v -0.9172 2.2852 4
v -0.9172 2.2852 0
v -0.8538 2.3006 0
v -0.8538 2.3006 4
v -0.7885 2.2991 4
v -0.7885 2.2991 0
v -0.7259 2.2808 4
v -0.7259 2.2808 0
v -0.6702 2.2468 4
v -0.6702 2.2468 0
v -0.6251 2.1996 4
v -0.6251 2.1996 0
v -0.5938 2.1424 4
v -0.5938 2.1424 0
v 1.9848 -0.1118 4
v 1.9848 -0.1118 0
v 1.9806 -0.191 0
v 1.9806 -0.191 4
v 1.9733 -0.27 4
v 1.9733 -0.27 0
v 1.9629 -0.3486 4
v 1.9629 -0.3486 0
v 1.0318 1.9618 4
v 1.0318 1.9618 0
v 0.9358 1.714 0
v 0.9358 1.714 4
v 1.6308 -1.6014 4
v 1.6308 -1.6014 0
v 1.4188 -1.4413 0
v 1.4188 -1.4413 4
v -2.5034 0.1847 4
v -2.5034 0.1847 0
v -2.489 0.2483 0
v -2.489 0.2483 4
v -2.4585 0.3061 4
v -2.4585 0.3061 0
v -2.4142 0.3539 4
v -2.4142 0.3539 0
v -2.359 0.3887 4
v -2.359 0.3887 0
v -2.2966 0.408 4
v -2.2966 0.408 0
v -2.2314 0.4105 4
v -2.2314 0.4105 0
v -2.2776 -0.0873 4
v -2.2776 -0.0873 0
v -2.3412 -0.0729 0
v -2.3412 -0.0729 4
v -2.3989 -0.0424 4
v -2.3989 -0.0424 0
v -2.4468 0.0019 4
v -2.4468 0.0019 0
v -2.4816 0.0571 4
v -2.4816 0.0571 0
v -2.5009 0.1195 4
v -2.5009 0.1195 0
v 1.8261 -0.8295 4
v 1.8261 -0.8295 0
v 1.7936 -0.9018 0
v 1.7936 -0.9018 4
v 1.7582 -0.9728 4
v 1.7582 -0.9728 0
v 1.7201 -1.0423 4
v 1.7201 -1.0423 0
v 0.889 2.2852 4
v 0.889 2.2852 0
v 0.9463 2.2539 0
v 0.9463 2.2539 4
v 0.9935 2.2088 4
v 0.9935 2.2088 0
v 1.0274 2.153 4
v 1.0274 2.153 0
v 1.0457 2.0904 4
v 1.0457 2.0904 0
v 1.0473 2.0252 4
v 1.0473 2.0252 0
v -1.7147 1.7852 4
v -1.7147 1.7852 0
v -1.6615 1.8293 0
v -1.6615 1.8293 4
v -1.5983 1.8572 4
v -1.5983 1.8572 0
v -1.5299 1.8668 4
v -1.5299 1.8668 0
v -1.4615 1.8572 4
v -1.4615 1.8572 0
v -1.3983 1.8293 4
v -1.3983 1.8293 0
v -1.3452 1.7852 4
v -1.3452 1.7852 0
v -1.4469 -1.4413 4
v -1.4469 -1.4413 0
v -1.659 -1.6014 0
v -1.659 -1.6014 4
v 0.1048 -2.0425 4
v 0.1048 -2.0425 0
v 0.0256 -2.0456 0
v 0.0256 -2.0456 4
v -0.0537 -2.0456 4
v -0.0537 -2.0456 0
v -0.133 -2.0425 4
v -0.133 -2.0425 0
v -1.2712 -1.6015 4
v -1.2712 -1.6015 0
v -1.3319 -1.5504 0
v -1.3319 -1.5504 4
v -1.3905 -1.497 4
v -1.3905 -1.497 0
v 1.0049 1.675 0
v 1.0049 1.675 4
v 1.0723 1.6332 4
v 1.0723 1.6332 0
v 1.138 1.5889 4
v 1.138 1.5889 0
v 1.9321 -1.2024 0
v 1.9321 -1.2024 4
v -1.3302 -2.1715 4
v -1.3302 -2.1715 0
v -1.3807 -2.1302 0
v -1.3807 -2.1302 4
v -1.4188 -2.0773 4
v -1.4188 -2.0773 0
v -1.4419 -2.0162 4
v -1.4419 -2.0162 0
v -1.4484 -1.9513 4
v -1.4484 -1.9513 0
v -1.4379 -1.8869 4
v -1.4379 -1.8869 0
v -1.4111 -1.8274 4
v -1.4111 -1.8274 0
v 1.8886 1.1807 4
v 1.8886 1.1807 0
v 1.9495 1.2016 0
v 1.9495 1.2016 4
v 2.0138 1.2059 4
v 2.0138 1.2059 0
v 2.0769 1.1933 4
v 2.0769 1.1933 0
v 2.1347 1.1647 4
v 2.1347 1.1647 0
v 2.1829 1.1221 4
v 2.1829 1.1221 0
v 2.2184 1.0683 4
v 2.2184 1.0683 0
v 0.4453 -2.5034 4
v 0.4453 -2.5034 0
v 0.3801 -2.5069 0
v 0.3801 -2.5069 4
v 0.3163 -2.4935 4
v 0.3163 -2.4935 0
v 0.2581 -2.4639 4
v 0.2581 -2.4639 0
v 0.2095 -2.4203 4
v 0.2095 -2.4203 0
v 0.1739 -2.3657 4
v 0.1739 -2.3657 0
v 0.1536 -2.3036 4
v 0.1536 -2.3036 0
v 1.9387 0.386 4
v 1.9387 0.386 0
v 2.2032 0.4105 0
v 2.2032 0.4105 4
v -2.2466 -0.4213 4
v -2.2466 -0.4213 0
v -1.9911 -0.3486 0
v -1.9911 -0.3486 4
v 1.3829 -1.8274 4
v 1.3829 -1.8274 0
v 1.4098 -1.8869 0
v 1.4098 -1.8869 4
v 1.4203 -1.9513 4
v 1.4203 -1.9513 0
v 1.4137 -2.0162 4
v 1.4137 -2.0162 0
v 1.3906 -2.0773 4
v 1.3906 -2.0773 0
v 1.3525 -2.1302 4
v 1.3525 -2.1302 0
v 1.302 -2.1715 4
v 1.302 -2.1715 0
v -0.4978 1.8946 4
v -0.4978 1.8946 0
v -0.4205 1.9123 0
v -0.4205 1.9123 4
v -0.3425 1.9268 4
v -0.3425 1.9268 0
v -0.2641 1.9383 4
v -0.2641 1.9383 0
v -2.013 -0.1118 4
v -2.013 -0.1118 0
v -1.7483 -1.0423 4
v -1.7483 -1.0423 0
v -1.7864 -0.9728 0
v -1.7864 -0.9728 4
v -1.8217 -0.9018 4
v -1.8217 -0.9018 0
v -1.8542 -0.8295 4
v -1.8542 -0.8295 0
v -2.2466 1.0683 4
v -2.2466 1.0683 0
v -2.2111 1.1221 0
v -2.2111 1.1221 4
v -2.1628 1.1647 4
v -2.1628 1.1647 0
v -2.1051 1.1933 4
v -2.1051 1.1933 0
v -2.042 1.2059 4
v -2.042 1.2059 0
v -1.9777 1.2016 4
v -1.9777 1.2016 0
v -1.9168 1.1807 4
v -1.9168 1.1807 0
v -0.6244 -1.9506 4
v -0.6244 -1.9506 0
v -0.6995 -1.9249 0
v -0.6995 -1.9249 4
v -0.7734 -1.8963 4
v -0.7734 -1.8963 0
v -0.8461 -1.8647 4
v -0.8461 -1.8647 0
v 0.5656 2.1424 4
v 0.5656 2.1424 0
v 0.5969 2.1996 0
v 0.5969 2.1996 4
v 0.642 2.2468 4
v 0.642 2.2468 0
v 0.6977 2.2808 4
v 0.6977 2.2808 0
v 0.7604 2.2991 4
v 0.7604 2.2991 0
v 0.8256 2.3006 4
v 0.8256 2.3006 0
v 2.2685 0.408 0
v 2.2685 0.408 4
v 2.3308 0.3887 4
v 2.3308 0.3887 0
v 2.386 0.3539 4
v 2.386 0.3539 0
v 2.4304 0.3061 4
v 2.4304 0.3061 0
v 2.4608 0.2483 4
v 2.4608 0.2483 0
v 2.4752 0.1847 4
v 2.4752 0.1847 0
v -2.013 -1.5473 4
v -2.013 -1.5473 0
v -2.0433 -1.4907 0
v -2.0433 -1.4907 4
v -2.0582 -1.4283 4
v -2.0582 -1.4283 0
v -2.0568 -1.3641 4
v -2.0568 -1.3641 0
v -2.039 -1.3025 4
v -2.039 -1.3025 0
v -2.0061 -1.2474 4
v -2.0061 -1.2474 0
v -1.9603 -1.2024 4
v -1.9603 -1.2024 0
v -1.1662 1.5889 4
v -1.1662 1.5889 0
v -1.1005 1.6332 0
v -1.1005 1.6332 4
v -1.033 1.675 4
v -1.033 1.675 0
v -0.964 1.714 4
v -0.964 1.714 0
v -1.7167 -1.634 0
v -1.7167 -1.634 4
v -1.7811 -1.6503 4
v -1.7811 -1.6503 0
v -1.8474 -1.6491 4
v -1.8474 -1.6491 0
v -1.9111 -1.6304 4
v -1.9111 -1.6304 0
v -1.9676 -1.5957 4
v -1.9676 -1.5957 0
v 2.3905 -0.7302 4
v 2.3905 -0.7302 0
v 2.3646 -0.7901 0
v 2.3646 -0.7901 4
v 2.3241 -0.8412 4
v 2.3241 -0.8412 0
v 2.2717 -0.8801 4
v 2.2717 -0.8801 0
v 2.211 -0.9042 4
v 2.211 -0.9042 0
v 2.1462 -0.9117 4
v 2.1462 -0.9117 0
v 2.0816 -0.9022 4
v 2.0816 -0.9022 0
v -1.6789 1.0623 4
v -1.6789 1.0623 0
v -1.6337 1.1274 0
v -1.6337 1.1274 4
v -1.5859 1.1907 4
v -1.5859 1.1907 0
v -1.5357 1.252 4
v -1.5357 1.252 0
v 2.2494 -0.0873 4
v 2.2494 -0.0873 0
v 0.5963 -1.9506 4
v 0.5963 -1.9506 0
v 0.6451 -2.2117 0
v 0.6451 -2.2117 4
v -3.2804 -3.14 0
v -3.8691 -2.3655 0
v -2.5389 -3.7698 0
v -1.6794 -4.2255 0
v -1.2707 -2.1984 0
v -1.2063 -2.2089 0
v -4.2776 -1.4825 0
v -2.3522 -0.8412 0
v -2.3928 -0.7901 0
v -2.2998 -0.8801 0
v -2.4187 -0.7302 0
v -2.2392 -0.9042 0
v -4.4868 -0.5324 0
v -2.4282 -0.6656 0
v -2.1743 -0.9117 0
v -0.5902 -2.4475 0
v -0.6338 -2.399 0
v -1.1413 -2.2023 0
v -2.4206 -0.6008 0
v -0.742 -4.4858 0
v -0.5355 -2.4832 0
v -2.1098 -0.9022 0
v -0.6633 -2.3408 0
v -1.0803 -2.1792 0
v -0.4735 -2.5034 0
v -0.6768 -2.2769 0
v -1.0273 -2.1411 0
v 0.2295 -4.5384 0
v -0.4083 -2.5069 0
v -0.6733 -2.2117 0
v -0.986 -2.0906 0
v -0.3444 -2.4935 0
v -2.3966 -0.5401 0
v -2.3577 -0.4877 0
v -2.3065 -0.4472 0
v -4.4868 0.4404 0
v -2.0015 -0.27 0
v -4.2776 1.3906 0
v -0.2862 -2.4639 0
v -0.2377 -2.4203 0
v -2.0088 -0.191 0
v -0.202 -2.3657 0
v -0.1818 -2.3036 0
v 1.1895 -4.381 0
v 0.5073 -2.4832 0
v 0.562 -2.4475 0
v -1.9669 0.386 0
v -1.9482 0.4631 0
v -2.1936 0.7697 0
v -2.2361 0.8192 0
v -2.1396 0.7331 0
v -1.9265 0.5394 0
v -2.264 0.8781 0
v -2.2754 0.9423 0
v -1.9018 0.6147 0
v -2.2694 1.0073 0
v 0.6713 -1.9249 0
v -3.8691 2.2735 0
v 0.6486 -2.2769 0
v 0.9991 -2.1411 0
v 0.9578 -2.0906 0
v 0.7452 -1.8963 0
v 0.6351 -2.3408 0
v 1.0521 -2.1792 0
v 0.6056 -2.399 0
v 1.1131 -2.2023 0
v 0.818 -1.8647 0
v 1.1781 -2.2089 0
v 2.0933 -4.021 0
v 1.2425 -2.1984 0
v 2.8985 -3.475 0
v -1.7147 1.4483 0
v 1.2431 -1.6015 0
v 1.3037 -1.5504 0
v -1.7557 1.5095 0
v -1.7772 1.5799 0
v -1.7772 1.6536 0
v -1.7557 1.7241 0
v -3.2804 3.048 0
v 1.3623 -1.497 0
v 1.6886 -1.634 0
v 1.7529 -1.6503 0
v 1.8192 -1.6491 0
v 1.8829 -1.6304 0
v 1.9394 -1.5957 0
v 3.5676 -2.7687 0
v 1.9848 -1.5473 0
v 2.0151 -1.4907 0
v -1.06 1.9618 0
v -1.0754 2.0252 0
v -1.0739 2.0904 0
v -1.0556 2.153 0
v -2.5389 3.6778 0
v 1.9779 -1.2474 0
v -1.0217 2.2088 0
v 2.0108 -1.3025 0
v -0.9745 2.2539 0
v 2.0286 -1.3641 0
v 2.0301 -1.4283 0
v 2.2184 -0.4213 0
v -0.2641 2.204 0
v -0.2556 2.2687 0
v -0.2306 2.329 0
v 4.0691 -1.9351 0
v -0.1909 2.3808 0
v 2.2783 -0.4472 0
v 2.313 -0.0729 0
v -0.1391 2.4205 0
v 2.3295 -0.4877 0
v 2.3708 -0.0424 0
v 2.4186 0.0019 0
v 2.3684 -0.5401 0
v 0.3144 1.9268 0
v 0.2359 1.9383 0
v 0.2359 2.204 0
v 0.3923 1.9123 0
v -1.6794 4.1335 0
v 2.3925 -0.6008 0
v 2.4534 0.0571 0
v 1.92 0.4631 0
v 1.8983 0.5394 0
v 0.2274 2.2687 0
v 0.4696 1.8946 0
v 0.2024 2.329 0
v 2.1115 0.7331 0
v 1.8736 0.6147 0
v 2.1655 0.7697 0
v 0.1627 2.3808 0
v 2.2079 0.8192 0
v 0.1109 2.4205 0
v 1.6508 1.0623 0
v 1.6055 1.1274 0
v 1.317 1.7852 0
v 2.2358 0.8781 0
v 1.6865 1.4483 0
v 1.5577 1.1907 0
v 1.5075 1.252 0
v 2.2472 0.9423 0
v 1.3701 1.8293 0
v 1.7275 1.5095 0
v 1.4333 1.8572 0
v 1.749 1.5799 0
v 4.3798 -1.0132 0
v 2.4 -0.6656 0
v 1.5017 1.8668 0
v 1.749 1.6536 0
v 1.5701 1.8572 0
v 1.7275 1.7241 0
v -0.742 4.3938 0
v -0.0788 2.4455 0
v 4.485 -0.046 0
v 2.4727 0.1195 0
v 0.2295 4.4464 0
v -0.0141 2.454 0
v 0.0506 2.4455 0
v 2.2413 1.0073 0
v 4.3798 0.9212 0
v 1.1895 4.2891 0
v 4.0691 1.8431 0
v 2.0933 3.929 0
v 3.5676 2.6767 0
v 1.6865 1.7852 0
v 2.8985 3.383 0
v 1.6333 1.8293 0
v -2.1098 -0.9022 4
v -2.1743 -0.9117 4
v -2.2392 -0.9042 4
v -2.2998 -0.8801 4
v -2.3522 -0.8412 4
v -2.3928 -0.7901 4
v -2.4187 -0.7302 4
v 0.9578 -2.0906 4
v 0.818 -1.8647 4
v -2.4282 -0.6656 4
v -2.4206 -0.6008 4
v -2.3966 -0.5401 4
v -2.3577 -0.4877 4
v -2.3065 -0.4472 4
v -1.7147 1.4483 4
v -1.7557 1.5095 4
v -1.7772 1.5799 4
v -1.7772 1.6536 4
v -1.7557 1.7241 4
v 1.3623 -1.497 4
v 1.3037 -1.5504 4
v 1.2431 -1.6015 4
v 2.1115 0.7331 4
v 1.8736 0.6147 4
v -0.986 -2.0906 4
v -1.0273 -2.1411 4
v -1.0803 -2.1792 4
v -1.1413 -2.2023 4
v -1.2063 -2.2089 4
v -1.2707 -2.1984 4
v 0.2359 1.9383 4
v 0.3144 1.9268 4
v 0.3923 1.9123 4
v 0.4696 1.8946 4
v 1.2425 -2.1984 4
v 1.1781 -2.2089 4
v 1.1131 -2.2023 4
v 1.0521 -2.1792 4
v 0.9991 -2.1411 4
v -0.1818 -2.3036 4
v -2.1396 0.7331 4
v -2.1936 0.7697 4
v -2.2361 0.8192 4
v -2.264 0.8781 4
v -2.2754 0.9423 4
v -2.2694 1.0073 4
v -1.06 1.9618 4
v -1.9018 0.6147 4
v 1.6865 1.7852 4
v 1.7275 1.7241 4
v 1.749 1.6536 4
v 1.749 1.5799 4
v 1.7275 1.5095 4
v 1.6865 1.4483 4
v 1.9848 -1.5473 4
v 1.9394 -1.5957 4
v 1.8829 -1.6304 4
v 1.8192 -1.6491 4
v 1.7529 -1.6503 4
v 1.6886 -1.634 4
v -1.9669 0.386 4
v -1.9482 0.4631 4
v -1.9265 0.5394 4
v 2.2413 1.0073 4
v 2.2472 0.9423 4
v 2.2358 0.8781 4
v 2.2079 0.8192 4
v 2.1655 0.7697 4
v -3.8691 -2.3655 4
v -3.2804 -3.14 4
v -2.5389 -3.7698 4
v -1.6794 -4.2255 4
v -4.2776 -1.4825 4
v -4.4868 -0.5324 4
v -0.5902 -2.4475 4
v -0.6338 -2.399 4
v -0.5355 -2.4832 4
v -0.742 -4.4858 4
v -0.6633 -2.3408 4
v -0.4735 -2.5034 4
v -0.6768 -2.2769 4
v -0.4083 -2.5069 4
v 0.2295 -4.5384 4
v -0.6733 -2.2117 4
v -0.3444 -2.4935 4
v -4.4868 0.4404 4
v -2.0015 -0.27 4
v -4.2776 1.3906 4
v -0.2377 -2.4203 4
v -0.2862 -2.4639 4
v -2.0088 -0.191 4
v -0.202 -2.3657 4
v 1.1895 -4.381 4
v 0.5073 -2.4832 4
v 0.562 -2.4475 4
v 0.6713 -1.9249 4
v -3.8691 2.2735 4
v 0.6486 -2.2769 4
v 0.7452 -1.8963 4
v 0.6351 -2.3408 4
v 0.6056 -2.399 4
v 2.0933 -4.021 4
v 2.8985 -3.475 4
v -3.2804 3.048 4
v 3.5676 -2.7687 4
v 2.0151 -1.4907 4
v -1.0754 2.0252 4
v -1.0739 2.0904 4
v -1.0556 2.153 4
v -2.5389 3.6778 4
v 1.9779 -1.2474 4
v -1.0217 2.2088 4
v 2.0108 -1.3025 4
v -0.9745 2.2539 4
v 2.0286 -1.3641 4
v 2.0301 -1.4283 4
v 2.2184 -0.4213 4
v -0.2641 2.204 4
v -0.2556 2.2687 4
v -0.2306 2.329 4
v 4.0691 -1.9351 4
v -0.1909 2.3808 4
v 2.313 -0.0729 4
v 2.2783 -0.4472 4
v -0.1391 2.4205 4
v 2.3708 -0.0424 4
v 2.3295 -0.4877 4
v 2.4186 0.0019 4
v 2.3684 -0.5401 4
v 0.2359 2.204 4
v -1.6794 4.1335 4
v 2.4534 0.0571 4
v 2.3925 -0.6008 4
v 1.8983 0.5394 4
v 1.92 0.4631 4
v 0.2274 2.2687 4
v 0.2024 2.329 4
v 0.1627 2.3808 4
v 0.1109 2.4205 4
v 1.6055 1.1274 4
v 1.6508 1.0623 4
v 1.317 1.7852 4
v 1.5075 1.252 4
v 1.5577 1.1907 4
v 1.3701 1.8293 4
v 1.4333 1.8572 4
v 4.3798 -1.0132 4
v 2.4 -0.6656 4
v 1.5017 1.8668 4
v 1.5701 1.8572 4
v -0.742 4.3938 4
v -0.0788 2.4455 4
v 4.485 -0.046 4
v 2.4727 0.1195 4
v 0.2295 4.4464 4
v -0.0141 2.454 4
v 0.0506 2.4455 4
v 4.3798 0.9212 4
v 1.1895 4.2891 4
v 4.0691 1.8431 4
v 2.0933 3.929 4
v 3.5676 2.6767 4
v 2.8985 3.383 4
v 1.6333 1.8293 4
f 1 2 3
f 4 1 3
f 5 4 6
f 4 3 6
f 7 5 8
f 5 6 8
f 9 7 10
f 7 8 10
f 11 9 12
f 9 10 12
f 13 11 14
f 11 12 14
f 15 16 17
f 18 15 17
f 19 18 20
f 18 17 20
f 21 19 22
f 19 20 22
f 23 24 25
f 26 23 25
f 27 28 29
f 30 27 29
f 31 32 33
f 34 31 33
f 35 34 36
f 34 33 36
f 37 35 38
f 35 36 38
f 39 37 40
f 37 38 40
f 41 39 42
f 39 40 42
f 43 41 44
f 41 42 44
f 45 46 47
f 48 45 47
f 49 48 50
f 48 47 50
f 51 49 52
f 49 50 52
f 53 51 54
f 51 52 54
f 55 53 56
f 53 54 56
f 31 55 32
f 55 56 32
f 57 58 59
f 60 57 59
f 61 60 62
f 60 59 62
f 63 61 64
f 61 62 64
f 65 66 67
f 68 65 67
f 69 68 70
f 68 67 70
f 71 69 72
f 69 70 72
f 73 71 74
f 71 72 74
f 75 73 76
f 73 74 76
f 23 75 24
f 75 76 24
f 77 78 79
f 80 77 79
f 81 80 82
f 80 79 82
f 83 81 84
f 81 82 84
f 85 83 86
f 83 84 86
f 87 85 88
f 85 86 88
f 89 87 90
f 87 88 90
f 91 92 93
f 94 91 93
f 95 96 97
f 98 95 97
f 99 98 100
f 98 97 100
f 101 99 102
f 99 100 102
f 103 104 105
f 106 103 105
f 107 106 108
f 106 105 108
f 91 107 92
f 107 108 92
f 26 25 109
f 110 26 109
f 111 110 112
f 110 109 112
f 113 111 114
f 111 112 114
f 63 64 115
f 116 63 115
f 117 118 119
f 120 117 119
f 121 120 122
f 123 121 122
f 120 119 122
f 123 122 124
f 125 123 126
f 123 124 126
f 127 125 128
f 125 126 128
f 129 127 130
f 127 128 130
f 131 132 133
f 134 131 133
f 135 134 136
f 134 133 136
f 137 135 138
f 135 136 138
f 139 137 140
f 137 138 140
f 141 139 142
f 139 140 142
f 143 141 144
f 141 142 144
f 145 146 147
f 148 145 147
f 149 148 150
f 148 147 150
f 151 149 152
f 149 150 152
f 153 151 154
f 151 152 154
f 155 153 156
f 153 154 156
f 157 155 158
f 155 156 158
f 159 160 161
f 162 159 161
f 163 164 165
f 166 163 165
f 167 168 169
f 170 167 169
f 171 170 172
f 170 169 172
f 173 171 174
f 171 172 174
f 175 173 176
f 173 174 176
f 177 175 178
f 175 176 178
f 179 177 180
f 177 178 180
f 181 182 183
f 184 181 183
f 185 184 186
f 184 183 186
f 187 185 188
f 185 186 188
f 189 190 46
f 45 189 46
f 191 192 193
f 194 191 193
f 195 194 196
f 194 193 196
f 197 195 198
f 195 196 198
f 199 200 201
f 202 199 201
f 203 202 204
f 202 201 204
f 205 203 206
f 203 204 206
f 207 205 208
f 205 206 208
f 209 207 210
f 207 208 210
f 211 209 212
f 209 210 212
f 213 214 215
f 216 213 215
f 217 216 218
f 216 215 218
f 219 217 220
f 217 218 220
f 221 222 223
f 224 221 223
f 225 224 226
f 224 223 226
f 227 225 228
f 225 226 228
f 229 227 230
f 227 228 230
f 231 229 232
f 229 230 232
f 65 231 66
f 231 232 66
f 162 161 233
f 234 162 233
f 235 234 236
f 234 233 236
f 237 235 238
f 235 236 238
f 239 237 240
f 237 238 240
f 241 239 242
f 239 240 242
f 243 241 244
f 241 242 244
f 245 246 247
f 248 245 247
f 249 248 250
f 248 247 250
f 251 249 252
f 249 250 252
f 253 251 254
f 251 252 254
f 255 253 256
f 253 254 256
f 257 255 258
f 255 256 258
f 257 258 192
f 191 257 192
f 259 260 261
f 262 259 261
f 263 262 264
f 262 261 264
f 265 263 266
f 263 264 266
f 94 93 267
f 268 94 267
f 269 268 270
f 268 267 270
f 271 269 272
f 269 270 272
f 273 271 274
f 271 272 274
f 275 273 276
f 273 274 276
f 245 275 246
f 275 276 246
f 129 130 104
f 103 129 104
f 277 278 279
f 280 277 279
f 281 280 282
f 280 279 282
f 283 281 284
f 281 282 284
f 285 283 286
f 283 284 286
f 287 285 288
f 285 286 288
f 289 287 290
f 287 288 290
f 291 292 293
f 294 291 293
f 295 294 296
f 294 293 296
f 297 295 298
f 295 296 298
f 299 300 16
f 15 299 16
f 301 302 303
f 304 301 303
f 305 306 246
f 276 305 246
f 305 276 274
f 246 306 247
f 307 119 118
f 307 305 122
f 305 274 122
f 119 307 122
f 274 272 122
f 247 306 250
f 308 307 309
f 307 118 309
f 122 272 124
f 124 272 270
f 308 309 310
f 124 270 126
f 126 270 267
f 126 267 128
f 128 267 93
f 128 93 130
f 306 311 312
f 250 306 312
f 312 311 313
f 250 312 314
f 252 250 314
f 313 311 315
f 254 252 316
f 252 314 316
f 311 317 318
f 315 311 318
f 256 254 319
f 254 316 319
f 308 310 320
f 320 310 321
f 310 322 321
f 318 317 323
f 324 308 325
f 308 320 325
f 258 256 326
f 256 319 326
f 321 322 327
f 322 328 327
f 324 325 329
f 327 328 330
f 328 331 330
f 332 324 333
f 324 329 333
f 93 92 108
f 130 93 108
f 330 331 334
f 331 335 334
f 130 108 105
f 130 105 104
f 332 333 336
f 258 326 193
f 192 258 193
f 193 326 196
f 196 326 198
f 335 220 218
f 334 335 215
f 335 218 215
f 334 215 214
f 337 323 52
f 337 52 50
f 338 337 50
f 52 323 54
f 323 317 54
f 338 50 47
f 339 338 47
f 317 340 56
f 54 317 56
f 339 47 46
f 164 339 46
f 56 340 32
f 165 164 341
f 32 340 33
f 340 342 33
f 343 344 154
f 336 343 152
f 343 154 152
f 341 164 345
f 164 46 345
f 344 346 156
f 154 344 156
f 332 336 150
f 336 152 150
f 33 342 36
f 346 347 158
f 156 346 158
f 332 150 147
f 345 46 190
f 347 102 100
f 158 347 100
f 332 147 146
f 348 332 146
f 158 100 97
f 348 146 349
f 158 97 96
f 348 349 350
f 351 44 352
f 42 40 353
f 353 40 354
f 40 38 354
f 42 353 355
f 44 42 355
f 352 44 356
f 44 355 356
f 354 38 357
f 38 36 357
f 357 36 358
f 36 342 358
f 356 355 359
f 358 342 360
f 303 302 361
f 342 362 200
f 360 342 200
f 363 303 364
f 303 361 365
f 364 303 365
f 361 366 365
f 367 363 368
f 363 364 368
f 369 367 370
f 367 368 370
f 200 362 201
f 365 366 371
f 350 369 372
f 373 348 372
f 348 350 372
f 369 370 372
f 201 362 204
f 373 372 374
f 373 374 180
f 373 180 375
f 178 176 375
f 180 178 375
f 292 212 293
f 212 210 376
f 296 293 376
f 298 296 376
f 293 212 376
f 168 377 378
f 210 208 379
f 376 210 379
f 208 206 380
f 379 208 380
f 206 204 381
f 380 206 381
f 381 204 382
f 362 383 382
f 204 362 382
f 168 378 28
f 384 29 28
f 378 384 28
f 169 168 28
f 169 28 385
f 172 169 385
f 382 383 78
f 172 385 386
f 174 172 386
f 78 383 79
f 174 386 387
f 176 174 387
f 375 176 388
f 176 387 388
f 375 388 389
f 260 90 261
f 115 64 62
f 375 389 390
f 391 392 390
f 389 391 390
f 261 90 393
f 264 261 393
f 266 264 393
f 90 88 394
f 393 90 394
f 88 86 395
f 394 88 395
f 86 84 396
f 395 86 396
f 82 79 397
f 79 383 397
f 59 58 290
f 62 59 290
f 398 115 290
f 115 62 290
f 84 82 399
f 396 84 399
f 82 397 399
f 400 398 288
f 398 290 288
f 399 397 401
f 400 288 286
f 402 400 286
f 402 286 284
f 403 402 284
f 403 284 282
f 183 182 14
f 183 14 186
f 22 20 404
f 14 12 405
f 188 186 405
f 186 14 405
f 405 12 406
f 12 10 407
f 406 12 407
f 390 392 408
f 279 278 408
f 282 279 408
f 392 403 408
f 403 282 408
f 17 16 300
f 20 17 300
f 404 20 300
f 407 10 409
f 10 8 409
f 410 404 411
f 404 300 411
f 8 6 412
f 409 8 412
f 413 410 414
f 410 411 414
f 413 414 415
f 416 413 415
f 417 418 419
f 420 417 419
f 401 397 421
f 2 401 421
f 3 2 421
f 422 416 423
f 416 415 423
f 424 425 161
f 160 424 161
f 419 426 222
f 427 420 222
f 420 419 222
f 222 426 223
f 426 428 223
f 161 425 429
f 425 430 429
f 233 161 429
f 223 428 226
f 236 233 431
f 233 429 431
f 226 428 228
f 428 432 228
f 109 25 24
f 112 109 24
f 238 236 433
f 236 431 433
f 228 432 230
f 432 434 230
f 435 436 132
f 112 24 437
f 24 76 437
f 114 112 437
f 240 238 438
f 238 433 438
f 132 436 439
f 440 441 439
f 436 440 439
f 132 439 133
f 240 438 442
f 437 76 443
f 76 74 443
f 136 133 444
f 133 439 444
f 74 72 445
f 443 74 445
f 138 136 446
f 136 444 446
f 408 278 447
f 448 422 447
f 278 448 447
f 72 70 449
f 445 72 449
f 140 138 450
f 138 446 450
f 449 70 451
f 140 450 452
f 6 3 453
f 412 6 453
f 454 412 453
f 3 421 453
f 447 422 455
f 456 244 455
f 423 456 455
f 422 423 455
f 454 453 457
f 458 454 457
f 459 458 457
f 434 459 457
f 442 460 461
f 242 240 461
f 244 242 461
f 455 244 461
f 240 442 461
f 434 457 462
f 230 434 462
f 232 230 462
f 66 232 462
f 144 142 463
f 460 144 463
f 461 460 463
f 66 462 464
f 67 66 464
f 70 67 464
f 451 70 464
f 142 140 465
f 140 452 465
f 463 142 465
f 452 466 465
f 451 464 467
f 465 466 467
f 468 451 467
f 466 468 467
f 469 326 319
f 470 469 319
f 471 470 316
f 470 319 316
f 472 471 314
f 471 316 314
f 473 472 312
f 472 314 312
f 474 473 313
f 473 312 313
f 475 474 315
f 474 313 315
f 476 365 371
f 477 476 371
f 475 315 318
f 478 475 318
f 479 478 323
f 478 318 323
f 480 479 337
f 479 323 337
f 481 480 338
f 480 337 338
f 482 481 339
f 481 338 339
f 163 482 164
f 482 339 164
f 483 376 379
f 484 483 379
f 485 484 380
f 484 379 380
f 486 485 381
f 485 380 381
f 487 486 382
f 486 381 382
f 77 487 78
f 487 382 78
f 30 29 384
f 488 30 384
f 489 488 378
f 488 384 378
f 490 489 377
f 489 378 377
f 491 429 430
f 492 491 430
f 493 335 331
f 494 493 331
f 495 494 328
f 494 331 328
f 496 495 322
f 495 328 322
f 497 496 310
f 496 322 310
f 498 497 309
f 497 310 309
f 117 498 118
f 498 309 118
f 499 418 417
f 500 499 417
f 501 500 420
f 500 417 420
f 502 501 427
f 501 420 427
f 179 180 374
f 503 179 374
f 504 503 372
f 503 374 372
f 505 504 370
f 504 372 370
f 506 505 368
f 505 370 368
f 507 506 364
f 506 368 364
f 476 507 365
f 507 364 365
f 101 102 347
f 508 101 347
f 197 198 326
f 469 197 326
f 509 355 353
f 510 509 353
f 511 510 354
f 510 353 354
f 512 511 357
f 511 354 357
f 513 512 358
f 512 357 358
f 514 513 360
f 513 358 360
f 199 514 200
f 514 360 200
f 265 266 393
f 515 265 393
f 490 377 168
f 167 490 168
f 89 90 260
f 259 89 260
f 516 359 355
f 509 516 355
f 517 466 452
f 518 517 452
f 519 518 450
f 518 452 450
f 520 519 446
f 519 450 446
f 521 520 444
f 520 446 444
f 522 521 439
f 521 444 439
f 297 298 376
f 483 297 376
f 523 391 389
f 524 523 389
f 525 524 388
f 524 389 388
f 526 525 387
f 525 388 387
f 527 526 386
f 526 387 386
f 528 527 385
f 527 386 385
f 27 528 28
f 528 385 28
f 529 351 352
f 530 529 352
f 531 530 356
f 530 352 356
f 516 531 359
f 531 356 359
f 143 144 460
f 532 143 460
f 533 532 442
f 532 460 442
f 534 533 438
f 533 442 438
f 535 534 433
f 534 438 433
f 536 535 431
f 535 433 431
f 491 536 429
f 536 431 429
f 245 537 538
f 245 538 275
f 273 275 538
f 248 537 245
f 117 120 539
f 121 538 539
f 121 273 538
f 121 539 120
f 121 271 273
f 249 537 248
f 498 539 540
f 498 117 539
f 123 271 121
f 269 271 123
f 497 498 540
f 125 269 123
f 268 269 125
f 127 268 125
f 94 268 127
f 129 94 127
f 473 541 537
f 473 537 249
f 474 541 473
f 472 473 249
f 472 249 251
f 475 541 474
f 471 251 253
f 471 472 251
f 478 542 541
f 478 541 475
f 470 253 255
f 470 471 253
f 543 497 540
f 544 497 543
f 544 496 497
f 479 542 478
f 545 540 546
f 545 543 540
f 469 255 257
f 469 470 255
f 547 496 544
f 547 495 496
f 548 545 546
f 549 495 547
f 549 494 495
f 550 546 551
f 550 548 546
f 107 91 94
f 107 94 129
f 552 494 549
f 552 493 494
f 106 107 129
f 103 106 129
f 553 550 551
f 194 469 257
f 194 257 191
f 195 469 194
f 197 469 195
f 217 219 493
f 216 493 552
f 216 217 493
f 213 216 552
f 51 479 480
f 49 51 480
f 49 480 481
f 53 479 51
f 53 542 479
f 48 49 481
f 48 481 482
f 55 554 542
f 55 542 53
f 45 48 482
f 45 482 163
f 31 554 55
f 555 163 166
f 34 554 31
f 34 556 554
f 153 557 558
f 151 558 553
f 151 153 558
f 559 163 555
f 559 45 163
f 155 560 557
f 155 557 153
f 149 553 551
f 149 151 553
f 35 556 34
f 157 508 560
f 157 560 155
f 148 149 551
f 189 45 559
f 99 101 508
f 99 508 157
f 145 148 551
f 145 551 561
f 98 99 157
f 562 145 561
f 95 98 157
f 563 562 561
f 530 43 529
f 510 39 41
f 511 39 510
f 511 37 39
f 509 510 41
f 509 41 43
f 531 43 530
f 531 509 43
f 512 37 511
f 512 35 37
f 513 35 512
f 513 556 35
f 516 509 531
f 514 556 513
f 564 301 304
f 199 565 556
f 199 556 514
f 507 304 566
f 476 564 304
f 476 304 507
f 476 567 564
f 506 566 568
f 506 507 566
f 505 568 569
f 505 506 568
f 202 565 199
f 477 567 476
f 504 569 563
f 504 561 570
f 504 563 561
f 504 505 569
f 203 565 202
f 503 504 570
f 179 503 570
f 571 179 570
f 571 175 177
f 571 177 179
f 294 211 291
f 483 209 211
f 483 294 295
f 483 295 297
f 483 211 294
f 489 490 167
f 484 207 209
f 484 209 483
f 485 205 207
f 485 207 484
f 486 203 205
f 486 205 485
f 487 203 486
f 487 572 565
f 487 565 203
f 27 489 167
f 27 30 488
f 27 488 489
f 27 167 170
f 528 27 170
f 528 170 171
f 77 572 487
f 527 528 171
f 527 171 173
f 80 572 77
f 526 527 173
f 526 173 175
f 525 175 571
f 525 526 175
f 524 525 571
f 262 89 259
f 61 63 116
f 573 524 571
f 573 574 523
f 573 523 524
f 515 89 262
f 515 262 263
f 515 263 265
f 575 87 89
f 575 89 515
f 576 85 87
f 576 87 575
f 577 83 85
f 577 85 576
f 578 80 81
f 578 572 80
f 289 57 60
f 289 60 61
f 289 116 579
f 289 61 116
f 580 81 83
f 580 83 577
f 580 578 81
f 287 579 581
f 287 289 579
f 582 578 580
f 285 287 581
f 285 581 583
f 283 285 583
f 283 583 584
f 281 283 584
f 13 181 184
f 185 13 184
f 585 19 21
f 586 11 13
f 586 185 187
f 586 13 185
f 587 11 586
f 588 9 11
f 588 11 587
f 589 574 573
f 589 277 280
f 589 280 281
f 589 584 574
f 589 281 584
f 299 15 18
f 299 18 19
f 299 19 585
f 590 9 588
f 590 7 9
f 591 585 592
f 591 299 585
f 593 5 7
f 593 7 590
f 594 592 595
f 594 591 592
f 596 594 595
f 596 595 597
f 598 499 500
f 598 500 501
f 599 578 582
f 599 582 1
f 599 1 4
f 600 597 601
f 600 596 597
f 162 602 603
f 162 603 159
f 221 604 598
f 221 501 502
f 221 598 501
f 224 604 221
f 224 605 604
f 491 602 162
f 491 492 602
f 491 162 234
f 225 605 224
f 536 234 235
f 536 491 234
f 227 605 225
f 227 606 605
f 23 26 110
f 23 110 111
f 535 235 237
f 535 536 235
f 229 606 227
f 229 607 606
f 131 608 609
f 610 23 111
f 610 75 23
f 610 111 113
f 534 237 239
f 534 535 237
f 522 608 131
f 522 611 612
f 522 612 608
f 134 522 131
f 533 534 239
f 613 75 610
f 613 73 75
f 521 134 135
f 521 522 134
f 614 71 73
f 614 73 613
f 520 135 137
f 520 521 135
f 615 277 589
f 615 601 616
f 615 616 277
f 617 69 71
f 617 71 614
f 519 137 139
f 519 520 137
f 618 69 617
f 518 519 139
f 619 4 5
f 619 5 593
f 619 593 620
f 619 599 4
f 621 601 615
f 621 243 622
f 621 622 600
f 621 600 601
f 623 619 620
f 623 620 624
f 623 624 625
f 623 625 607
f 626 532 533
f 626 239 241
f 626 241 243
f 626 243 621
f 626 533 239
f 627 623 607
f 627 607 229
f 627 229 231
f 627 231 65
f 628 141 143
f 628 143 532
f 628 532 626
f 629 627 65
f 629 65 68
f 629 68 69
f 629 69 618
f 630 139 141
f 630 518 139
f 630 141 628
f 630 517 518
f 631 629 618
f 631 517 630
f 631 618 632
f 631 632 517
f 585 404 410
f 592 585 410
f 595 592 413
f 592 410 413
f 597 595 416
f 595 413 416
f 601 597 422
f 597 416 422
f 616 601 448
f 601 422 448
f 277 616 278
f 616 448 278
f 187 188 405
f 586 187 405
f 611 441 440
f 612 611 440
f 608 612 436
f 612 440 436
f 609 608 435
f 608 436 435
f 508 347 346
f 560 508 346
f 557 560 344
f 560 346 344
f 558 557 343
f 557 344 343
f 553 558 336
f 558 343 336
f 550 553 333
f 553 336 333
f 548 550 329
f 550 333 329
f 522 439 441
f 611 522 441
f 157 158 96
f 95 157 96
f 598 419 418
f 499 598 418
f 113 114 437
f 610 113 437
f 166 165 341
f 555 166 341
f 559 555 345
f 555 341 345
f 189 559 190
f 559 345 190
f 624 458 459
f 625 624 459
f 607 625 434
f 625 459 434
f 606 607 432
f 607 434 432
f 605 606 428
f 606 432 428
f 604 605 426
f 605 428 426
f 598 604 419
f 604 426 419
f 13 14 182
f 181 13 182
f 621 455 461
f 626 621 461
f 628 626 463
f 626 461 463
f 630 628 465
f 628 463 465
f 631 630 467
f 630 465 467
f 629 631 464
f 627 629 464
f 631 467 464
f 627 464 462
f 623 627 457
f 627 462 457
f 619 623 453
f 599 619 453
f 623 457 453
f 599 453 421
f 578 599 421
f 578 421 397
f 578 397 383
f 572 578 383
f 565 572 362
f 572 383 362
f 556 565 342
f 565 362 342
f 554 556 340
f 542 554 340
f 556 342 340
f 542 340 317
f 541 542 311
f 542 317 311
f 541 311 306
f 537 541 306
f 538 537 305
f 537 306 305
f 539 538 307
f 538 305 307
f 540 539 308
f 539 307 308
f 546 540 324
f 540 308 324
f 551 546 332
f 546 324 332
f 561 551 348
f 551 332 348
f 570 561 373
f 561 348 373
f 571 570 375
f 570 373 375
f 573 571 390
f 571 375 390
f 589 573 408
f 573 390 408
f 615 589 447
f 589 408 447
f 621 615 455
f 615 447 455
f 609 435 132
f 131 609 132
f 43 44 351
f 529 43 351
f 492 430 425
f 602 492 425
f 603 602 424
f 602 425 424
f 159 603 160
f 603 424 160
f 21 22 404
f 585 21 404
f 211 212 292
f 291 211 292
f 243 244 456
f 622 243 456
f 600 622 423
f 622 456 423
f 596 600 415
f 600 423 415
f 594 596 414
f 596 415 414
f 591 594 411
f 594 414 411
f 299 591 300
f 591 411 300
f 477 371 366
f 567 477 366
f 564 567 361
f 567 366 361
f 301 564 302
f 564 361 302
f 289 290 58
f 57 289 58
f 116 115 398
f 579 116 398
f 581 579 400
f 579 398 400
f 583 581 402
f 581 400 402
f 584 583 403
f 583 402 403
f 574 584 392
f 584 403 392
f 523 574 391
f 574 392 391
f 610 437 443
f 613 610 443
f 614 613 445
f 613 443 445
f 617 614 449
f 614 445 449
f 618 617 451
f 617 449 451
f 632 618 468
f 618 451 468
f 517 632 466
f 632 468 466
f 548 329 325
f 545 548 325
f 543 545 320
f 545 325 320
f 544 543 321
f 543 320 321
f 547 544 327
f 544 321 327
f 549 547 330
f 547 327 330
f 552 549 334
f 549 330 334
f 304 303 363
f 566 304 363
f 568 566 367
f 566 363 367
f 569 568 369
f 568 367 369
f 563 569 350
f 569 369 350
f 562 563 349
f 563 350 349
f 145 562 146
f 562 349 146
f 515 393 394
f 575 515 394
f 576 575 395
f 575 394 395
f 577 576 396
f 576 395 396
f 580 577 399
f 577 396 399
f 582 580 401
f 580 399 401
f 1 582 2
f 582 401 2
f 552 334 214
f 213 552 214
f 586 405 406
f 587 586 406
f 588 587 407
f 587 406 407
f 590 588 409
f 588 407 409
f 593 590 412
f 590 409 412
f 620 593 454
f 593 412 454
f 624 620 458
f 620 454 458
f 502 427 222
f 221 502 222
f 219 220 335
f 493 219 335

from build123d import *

# Parameters (mm, degrees)
F0_R     = 4.49904
F1_DEPTH = 4


with BuildPart() as f1:
    # F0 (on Top) → F1 (new body)
    with BuildSketch(Plane.XY):
        with Locations((-0.014088, -0.045997)):
            Circle(F0_R)
        with BuildLine():
            ThreePointArc((1.873632, 0.614697), (1.909564, 0.501329), (1.938694, 0.386026))
            Line((1.938694, 0.386026), (2.203247, 0.410541))
            ThreePointArc((2.203247, 0.410541), (2.386026, 0.353941), (2.475248, 0.184674))
            ThreePointArc((2.475248, 0.184674), (2.418648, 0.001895), (2.249381, -0.087326))
            Line((2.249381, -0.087326), (1.984828, -0.111841))
            ThreePointArc((1.984828, -0.111841), (1.977381, -0.230533), (1.962892, -0.348573))
            Line((1.962892, -0.348573), (2.218436, -0.421282))
            ThreePointArc((2.218436, -0.421282), (2.368426, -0.540087), (2.390476, -0.730154))
            ThreePointArc((2.390476, -0.730154), (2.271671, -0.880144), (2.081604, -0.902195))
            Line((2.081604, -0.902195), (1.82606, -0.829486))
            ThreePointArc((1.82606, -0.829486), (1.776239, -0.937473), (1.720087, -1.042308))
            Line((1.720087, -1.042308), (1.93211, -1.20242))
            ThreePointArc((1.93211, -1.20242), (2.028581, -1.36415), (1.984828, -1.547313))
            ThreePointArc((1.984828, -1.547313), (1.819226, -1.649054), (1.630792, -1.601429))
            Line((1.630792, -1.601429), (1.41877, -1.441317))
            ThreePointArc((1.41877, -1.441317), (1.333304, -1.524015), (1.243073, -1.601486))
            Line((1.243073, -1.601486), (1.382939, -1.827377))
            ThreePointArc((1.382939, -1.827377), (1.413744, -2.016223), (1.301993, -2.17154))
            ThreePointArc((1.301993, -2.17154), (1.113147, -2.202345), (0.95783, -2.090593))
            Line((0.95783, -2.090593), (0.817964, -1.864702))
            ThreePointArc((0.817964, -1.864702), (0.708396, -1.910941), (0.596272, -1.950586))
            Line((0.596272, -1.950586), (0.645092, -2.211749))
            ThreePointArc((0.645092, -2.211749), (0.605598, -2.39897), (0.445286, -2.503429))
            ThreePointArc((0.445286, -2.503429), (0.258065, -2.463936), (0.153605, -2.303624))
            Line((0.153605, -2.303624), (0.104786, -2.042461))
            ThreePointArc((0.104786, -2.042461), (-0.014088, -2.045997), (-0.132961, -2.042461))
            Line((-0.132961, -2.042461), (-0.181781, -2.303624))
            ThreePointArc((-0.181781, -2.303624), (-0.28624, -2.463936), (-0.473461, -2.503429))
            ThreePointArc((-0.473461, -2.503429), (-0.633773, -2.39897), (-0.673267, -2.211749))
            Line((-0.673267, -2.211749), (-0.624448, -1.950586))
            ThreePointArc((-0.624448, -1.950586), (-0.736571, -1.910941), (-0.84614, -1.864702))
            Line((-0.84614, -1.864702), (-0.986006, -2.090593))
            ThreePointArc((-0.986006, -2.090593), (-1.141322, -2.202345), (-1.330168, -2.17154))
            ThreePointArc((-1.330168, -2.17154), (-1.44192, -2.016223), (-1.411114, -1.827377))
            Line((-1.411114, -1.827377), (-1.271248, -1.601486))
            ThreePointArc((-1.271248, -1.601486), (-1.361479, -1.524015), (-1.446945, -1.441317))
            Line((-1.446945, -1.441317), (-1.658968, -1.601429))
            ThreePointArc((-1.658968, -1.601429), (-1.847401, -1.649054), (-2.013004, -1.547313))
            ThreePointArc((-2.013004, -1.547313), (-2.056756, -1.36415), (-1.960285, -1.20242))
            Line((-1.960285, -1.20242), (-1.748263, -1.042308))
            ThreePointArc((-1.748263, -1.042308), (-1.804414, -0.937473), (-1.854236, -0.829486))
            Line((-1.854236, -0.829486), (-2.10978, -0.902195))
            ThreePointArc((-2.10978, -0.902195), (-2.299846, -0.880144), (-2.418652, -0.730154))
            ThreePointArc((-2.418652, -0.730154), (-2.396601, -0.540087), (-2.246611, -0.421282))
            Line((-2.246611, -0.421282), (-1.991067, -0.348573))
            ThreePointArc((-1.991067, -0.348573), (-2.005556, -0.230533), (-2.013004, -0.111841))
            Line((-2.013004, -0.111841), (-2.277557, -0.087326))
            ThreePointArc((-2.277557, -0.087326), (-2.446823, 0.001895), (-2.503423, 0.184674))
            ThreePointArc((-2.503423, 0.184674), (-2.414201, 0.353941), (-2.231422, 0.410541))
            Line((-2.231422, 0.410541), (-1.966869, 0.386026))
            ThreePointArc((-1.966869, 0.386026), (-1.937739, 0.501329), (-1.901807, 0.614697))
            Line((-1.901807, 0.614697), (-2.13964, 0.733124))
            ThreePointArc((-2.13964, 0.733124), (-2.263982, 0.878126), (-2.246611, 1.068349))
            ThreePointArc((-2.246611, 1.068349), (-2.105122, 1.193314), (-1.91677, 1.180705))
            Line((-1.91677, 1.180705), (-1.678938, 1.062279))
            ThreePointArc((-1.678938, 1.062279), (-1.610122, 1.159273), (-1.535663, 1.252005))
            Line((-1.535663, 1.252005), (-1.714655, 1.448349))
            ThreePointArc((-1.714655, 1.448349), (-1.779903, 1.616773), (-1.714655, 1.785197))
            ThreePointArc((-1.714655, 1.785197), (-1.529903, 1.866773), (-1.345151, 1.785197))
            Line((-1.345151, 1.785197), (-1.166159, 1.588853))
            ThreePointArc((-1.166159, 1.588853), (-1.066952, 1.654438), (-0.964022, 1.71401))
            Line((-0.964022, 1.71401), (-1.059999, 1.961755))
            ThreePointArc((-1.059999, 1.961755), (-1.05558, 2.153046), (-0.917192, 2.285184))
            ThreePointArc((-0.917192, 2.285184), (-0.725901, 2.280764), (-0.593763, 2.142376))
            Line((-0.593763, 2.142376), (-0.497786, 1.894631))
            ThreePointArc((-0.497786, 1.894631), (-0.381587, 1.919949), (-0.264088, 1.938317))
            Line((-0.264088, 1.938317), (-0.264088, 2.204003))
            ThreePointArc((-0.264088, 2.204003), (-0.190864, 2.38078), (-0.014088, 2.454003))
            ThreePointArc((-0.014088, 2.454003), (0.162689, 2.38078), (0.235912, 2.204003))
            Line((0.235912, 2.204003), (0.235912, 1.938317))
            ThreePointArc((0.235912, 1.938317), (0.353411, 1.919949), (0.469611, 1.894631))
            Line((0.469611, 1.894631), (0.565588, 2.142376))
            ThreePointArc((0.565588, 2.142376), (0.697726, 2.280764), (0.889016, 2.285184))
            ThreePointArc((0.889016, 2.285184), (1.027405, 2.153046), (1.031824, 1.961755))
            Line((1.031824, 1.961755), (0.935847, 1.71401))
            ThreePointArc((0.935847, 1.71401), (1.038777, 1.654438), (1.137983, 1.588853))
            Line((1.137983, 1.588853), (1.316975, 1.785197))
            ThreePointArc((1.316975, 1.785197), (1.501728, 1.866773), (1.68648, 1.785197))
            ThreePointArc((1.68648, 1.785197), (1.751728, 1.616773), (1.68648, 1.448349))
            Line((1.68648, 1.448349), (1.507488, 1.252005))
            ThreePointArc((1.507488, 1.252005), (1.581947, 1.159273), (1.650762, 1.062279))
            Line((1.650762, 1.062279), (1.888595, 1.180705))
            ThreePointArc((1.888595, 1.180705), (2.076947, 1.193314), (2.218436, 1.068349))
            ThreePointArc((2.218436, 1.068349), (2.235807, 0.878126), (2.111464, 0.733124))
            Line((2.111464, 0.733124), (1.873632, 0.614697))
        make_face(mode=Mode.SUBTRACT)
    extrude(amount=F1_DEPTH)


solid = f1.part
